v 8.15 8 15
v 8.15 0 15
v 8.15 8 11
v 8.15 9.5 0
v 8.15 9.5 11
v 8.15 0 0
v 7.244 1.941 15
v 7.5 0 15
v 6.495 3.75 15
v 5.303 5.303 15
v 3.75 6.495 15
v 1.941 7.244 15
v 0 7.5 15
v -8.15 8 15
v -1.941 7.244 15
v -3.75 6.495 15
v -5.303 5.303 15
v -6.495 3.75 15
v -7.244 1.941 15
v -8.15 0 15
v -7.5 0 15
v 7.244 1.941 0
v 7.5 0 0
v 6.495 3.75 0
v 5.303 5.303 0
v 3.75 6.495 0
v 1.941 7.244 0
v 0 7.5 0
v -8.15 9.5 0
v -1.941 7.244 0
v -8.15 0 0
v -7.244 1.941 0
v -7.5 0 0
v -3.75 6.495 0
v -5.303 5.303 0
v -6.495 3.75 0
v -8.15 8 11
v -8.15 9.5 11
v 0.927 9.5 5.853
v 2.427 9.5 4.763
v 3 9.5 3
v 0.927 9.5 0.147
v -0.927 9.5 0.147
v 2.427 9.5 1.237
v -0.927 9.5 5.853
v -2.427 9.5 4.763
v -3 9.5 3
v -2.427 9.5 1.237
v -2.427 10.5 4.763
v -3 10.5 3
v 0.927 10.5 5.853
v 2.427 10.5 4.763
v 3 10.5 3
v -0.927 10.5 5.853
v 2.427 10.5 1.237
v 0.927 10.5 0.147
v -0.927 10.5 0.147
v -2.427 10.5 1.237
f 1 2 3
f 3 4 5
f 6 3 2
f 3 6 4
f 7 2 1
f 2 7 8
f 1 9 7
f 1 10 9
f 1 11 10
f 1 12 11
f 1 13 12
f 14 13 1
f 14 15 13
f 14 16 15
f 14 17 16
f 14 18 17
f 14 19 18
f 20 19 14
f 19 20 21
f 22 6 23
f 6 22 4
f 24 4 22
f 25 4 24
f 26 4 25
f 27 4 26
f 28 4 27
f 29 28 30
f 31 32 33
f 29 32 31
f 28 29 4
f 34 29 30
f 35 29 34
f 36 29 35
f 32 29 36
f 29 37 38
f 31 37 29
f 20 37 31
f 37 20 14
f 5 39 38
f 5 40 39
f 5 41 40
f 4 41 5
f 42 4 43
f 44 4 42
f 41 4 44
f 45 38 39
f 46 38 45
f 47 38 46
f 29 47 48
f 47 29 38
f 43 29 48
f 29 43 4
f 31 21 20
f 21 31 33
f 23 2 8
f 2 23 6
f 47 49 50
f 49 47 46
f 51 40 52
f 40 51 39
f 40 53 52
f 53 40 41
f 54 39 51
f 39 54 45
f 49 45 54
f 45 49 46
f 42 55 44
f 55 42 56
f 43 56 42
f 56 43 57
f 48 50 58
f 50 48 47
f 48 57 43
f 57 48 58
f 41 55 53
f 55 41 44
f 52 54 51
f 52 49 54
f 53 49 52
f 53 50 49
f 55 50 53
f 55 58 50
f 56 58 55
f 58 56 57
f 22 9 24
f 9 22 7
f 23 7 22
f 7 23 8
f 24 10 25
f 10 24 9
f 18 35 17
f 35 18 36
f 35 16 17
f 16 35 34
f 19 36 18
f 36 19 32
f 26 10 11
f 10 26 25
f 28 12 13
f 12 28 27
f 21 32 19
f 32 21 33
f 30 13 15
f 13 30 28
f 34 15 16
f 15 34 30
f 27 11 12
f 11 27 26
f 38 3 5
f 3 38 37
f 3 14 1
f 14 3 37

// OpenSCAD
adapter_width = 16.3;
a_depth = 9.5;
a_height = 15;

difference() {
  translate([-adapter_width/2,0,0]) {
    cube([adapter_width,a_depth,a_height]);
    translate([adapter_width/2,a_depth,3]) rotate([90,0,0]) cylinder(r=3.0,h=2,center=true);
  }
  cylinder(r=15/2,h=90);
  translate([0,a_depth,a_height-2]) #cube([20,3,4],center=true);
}   
